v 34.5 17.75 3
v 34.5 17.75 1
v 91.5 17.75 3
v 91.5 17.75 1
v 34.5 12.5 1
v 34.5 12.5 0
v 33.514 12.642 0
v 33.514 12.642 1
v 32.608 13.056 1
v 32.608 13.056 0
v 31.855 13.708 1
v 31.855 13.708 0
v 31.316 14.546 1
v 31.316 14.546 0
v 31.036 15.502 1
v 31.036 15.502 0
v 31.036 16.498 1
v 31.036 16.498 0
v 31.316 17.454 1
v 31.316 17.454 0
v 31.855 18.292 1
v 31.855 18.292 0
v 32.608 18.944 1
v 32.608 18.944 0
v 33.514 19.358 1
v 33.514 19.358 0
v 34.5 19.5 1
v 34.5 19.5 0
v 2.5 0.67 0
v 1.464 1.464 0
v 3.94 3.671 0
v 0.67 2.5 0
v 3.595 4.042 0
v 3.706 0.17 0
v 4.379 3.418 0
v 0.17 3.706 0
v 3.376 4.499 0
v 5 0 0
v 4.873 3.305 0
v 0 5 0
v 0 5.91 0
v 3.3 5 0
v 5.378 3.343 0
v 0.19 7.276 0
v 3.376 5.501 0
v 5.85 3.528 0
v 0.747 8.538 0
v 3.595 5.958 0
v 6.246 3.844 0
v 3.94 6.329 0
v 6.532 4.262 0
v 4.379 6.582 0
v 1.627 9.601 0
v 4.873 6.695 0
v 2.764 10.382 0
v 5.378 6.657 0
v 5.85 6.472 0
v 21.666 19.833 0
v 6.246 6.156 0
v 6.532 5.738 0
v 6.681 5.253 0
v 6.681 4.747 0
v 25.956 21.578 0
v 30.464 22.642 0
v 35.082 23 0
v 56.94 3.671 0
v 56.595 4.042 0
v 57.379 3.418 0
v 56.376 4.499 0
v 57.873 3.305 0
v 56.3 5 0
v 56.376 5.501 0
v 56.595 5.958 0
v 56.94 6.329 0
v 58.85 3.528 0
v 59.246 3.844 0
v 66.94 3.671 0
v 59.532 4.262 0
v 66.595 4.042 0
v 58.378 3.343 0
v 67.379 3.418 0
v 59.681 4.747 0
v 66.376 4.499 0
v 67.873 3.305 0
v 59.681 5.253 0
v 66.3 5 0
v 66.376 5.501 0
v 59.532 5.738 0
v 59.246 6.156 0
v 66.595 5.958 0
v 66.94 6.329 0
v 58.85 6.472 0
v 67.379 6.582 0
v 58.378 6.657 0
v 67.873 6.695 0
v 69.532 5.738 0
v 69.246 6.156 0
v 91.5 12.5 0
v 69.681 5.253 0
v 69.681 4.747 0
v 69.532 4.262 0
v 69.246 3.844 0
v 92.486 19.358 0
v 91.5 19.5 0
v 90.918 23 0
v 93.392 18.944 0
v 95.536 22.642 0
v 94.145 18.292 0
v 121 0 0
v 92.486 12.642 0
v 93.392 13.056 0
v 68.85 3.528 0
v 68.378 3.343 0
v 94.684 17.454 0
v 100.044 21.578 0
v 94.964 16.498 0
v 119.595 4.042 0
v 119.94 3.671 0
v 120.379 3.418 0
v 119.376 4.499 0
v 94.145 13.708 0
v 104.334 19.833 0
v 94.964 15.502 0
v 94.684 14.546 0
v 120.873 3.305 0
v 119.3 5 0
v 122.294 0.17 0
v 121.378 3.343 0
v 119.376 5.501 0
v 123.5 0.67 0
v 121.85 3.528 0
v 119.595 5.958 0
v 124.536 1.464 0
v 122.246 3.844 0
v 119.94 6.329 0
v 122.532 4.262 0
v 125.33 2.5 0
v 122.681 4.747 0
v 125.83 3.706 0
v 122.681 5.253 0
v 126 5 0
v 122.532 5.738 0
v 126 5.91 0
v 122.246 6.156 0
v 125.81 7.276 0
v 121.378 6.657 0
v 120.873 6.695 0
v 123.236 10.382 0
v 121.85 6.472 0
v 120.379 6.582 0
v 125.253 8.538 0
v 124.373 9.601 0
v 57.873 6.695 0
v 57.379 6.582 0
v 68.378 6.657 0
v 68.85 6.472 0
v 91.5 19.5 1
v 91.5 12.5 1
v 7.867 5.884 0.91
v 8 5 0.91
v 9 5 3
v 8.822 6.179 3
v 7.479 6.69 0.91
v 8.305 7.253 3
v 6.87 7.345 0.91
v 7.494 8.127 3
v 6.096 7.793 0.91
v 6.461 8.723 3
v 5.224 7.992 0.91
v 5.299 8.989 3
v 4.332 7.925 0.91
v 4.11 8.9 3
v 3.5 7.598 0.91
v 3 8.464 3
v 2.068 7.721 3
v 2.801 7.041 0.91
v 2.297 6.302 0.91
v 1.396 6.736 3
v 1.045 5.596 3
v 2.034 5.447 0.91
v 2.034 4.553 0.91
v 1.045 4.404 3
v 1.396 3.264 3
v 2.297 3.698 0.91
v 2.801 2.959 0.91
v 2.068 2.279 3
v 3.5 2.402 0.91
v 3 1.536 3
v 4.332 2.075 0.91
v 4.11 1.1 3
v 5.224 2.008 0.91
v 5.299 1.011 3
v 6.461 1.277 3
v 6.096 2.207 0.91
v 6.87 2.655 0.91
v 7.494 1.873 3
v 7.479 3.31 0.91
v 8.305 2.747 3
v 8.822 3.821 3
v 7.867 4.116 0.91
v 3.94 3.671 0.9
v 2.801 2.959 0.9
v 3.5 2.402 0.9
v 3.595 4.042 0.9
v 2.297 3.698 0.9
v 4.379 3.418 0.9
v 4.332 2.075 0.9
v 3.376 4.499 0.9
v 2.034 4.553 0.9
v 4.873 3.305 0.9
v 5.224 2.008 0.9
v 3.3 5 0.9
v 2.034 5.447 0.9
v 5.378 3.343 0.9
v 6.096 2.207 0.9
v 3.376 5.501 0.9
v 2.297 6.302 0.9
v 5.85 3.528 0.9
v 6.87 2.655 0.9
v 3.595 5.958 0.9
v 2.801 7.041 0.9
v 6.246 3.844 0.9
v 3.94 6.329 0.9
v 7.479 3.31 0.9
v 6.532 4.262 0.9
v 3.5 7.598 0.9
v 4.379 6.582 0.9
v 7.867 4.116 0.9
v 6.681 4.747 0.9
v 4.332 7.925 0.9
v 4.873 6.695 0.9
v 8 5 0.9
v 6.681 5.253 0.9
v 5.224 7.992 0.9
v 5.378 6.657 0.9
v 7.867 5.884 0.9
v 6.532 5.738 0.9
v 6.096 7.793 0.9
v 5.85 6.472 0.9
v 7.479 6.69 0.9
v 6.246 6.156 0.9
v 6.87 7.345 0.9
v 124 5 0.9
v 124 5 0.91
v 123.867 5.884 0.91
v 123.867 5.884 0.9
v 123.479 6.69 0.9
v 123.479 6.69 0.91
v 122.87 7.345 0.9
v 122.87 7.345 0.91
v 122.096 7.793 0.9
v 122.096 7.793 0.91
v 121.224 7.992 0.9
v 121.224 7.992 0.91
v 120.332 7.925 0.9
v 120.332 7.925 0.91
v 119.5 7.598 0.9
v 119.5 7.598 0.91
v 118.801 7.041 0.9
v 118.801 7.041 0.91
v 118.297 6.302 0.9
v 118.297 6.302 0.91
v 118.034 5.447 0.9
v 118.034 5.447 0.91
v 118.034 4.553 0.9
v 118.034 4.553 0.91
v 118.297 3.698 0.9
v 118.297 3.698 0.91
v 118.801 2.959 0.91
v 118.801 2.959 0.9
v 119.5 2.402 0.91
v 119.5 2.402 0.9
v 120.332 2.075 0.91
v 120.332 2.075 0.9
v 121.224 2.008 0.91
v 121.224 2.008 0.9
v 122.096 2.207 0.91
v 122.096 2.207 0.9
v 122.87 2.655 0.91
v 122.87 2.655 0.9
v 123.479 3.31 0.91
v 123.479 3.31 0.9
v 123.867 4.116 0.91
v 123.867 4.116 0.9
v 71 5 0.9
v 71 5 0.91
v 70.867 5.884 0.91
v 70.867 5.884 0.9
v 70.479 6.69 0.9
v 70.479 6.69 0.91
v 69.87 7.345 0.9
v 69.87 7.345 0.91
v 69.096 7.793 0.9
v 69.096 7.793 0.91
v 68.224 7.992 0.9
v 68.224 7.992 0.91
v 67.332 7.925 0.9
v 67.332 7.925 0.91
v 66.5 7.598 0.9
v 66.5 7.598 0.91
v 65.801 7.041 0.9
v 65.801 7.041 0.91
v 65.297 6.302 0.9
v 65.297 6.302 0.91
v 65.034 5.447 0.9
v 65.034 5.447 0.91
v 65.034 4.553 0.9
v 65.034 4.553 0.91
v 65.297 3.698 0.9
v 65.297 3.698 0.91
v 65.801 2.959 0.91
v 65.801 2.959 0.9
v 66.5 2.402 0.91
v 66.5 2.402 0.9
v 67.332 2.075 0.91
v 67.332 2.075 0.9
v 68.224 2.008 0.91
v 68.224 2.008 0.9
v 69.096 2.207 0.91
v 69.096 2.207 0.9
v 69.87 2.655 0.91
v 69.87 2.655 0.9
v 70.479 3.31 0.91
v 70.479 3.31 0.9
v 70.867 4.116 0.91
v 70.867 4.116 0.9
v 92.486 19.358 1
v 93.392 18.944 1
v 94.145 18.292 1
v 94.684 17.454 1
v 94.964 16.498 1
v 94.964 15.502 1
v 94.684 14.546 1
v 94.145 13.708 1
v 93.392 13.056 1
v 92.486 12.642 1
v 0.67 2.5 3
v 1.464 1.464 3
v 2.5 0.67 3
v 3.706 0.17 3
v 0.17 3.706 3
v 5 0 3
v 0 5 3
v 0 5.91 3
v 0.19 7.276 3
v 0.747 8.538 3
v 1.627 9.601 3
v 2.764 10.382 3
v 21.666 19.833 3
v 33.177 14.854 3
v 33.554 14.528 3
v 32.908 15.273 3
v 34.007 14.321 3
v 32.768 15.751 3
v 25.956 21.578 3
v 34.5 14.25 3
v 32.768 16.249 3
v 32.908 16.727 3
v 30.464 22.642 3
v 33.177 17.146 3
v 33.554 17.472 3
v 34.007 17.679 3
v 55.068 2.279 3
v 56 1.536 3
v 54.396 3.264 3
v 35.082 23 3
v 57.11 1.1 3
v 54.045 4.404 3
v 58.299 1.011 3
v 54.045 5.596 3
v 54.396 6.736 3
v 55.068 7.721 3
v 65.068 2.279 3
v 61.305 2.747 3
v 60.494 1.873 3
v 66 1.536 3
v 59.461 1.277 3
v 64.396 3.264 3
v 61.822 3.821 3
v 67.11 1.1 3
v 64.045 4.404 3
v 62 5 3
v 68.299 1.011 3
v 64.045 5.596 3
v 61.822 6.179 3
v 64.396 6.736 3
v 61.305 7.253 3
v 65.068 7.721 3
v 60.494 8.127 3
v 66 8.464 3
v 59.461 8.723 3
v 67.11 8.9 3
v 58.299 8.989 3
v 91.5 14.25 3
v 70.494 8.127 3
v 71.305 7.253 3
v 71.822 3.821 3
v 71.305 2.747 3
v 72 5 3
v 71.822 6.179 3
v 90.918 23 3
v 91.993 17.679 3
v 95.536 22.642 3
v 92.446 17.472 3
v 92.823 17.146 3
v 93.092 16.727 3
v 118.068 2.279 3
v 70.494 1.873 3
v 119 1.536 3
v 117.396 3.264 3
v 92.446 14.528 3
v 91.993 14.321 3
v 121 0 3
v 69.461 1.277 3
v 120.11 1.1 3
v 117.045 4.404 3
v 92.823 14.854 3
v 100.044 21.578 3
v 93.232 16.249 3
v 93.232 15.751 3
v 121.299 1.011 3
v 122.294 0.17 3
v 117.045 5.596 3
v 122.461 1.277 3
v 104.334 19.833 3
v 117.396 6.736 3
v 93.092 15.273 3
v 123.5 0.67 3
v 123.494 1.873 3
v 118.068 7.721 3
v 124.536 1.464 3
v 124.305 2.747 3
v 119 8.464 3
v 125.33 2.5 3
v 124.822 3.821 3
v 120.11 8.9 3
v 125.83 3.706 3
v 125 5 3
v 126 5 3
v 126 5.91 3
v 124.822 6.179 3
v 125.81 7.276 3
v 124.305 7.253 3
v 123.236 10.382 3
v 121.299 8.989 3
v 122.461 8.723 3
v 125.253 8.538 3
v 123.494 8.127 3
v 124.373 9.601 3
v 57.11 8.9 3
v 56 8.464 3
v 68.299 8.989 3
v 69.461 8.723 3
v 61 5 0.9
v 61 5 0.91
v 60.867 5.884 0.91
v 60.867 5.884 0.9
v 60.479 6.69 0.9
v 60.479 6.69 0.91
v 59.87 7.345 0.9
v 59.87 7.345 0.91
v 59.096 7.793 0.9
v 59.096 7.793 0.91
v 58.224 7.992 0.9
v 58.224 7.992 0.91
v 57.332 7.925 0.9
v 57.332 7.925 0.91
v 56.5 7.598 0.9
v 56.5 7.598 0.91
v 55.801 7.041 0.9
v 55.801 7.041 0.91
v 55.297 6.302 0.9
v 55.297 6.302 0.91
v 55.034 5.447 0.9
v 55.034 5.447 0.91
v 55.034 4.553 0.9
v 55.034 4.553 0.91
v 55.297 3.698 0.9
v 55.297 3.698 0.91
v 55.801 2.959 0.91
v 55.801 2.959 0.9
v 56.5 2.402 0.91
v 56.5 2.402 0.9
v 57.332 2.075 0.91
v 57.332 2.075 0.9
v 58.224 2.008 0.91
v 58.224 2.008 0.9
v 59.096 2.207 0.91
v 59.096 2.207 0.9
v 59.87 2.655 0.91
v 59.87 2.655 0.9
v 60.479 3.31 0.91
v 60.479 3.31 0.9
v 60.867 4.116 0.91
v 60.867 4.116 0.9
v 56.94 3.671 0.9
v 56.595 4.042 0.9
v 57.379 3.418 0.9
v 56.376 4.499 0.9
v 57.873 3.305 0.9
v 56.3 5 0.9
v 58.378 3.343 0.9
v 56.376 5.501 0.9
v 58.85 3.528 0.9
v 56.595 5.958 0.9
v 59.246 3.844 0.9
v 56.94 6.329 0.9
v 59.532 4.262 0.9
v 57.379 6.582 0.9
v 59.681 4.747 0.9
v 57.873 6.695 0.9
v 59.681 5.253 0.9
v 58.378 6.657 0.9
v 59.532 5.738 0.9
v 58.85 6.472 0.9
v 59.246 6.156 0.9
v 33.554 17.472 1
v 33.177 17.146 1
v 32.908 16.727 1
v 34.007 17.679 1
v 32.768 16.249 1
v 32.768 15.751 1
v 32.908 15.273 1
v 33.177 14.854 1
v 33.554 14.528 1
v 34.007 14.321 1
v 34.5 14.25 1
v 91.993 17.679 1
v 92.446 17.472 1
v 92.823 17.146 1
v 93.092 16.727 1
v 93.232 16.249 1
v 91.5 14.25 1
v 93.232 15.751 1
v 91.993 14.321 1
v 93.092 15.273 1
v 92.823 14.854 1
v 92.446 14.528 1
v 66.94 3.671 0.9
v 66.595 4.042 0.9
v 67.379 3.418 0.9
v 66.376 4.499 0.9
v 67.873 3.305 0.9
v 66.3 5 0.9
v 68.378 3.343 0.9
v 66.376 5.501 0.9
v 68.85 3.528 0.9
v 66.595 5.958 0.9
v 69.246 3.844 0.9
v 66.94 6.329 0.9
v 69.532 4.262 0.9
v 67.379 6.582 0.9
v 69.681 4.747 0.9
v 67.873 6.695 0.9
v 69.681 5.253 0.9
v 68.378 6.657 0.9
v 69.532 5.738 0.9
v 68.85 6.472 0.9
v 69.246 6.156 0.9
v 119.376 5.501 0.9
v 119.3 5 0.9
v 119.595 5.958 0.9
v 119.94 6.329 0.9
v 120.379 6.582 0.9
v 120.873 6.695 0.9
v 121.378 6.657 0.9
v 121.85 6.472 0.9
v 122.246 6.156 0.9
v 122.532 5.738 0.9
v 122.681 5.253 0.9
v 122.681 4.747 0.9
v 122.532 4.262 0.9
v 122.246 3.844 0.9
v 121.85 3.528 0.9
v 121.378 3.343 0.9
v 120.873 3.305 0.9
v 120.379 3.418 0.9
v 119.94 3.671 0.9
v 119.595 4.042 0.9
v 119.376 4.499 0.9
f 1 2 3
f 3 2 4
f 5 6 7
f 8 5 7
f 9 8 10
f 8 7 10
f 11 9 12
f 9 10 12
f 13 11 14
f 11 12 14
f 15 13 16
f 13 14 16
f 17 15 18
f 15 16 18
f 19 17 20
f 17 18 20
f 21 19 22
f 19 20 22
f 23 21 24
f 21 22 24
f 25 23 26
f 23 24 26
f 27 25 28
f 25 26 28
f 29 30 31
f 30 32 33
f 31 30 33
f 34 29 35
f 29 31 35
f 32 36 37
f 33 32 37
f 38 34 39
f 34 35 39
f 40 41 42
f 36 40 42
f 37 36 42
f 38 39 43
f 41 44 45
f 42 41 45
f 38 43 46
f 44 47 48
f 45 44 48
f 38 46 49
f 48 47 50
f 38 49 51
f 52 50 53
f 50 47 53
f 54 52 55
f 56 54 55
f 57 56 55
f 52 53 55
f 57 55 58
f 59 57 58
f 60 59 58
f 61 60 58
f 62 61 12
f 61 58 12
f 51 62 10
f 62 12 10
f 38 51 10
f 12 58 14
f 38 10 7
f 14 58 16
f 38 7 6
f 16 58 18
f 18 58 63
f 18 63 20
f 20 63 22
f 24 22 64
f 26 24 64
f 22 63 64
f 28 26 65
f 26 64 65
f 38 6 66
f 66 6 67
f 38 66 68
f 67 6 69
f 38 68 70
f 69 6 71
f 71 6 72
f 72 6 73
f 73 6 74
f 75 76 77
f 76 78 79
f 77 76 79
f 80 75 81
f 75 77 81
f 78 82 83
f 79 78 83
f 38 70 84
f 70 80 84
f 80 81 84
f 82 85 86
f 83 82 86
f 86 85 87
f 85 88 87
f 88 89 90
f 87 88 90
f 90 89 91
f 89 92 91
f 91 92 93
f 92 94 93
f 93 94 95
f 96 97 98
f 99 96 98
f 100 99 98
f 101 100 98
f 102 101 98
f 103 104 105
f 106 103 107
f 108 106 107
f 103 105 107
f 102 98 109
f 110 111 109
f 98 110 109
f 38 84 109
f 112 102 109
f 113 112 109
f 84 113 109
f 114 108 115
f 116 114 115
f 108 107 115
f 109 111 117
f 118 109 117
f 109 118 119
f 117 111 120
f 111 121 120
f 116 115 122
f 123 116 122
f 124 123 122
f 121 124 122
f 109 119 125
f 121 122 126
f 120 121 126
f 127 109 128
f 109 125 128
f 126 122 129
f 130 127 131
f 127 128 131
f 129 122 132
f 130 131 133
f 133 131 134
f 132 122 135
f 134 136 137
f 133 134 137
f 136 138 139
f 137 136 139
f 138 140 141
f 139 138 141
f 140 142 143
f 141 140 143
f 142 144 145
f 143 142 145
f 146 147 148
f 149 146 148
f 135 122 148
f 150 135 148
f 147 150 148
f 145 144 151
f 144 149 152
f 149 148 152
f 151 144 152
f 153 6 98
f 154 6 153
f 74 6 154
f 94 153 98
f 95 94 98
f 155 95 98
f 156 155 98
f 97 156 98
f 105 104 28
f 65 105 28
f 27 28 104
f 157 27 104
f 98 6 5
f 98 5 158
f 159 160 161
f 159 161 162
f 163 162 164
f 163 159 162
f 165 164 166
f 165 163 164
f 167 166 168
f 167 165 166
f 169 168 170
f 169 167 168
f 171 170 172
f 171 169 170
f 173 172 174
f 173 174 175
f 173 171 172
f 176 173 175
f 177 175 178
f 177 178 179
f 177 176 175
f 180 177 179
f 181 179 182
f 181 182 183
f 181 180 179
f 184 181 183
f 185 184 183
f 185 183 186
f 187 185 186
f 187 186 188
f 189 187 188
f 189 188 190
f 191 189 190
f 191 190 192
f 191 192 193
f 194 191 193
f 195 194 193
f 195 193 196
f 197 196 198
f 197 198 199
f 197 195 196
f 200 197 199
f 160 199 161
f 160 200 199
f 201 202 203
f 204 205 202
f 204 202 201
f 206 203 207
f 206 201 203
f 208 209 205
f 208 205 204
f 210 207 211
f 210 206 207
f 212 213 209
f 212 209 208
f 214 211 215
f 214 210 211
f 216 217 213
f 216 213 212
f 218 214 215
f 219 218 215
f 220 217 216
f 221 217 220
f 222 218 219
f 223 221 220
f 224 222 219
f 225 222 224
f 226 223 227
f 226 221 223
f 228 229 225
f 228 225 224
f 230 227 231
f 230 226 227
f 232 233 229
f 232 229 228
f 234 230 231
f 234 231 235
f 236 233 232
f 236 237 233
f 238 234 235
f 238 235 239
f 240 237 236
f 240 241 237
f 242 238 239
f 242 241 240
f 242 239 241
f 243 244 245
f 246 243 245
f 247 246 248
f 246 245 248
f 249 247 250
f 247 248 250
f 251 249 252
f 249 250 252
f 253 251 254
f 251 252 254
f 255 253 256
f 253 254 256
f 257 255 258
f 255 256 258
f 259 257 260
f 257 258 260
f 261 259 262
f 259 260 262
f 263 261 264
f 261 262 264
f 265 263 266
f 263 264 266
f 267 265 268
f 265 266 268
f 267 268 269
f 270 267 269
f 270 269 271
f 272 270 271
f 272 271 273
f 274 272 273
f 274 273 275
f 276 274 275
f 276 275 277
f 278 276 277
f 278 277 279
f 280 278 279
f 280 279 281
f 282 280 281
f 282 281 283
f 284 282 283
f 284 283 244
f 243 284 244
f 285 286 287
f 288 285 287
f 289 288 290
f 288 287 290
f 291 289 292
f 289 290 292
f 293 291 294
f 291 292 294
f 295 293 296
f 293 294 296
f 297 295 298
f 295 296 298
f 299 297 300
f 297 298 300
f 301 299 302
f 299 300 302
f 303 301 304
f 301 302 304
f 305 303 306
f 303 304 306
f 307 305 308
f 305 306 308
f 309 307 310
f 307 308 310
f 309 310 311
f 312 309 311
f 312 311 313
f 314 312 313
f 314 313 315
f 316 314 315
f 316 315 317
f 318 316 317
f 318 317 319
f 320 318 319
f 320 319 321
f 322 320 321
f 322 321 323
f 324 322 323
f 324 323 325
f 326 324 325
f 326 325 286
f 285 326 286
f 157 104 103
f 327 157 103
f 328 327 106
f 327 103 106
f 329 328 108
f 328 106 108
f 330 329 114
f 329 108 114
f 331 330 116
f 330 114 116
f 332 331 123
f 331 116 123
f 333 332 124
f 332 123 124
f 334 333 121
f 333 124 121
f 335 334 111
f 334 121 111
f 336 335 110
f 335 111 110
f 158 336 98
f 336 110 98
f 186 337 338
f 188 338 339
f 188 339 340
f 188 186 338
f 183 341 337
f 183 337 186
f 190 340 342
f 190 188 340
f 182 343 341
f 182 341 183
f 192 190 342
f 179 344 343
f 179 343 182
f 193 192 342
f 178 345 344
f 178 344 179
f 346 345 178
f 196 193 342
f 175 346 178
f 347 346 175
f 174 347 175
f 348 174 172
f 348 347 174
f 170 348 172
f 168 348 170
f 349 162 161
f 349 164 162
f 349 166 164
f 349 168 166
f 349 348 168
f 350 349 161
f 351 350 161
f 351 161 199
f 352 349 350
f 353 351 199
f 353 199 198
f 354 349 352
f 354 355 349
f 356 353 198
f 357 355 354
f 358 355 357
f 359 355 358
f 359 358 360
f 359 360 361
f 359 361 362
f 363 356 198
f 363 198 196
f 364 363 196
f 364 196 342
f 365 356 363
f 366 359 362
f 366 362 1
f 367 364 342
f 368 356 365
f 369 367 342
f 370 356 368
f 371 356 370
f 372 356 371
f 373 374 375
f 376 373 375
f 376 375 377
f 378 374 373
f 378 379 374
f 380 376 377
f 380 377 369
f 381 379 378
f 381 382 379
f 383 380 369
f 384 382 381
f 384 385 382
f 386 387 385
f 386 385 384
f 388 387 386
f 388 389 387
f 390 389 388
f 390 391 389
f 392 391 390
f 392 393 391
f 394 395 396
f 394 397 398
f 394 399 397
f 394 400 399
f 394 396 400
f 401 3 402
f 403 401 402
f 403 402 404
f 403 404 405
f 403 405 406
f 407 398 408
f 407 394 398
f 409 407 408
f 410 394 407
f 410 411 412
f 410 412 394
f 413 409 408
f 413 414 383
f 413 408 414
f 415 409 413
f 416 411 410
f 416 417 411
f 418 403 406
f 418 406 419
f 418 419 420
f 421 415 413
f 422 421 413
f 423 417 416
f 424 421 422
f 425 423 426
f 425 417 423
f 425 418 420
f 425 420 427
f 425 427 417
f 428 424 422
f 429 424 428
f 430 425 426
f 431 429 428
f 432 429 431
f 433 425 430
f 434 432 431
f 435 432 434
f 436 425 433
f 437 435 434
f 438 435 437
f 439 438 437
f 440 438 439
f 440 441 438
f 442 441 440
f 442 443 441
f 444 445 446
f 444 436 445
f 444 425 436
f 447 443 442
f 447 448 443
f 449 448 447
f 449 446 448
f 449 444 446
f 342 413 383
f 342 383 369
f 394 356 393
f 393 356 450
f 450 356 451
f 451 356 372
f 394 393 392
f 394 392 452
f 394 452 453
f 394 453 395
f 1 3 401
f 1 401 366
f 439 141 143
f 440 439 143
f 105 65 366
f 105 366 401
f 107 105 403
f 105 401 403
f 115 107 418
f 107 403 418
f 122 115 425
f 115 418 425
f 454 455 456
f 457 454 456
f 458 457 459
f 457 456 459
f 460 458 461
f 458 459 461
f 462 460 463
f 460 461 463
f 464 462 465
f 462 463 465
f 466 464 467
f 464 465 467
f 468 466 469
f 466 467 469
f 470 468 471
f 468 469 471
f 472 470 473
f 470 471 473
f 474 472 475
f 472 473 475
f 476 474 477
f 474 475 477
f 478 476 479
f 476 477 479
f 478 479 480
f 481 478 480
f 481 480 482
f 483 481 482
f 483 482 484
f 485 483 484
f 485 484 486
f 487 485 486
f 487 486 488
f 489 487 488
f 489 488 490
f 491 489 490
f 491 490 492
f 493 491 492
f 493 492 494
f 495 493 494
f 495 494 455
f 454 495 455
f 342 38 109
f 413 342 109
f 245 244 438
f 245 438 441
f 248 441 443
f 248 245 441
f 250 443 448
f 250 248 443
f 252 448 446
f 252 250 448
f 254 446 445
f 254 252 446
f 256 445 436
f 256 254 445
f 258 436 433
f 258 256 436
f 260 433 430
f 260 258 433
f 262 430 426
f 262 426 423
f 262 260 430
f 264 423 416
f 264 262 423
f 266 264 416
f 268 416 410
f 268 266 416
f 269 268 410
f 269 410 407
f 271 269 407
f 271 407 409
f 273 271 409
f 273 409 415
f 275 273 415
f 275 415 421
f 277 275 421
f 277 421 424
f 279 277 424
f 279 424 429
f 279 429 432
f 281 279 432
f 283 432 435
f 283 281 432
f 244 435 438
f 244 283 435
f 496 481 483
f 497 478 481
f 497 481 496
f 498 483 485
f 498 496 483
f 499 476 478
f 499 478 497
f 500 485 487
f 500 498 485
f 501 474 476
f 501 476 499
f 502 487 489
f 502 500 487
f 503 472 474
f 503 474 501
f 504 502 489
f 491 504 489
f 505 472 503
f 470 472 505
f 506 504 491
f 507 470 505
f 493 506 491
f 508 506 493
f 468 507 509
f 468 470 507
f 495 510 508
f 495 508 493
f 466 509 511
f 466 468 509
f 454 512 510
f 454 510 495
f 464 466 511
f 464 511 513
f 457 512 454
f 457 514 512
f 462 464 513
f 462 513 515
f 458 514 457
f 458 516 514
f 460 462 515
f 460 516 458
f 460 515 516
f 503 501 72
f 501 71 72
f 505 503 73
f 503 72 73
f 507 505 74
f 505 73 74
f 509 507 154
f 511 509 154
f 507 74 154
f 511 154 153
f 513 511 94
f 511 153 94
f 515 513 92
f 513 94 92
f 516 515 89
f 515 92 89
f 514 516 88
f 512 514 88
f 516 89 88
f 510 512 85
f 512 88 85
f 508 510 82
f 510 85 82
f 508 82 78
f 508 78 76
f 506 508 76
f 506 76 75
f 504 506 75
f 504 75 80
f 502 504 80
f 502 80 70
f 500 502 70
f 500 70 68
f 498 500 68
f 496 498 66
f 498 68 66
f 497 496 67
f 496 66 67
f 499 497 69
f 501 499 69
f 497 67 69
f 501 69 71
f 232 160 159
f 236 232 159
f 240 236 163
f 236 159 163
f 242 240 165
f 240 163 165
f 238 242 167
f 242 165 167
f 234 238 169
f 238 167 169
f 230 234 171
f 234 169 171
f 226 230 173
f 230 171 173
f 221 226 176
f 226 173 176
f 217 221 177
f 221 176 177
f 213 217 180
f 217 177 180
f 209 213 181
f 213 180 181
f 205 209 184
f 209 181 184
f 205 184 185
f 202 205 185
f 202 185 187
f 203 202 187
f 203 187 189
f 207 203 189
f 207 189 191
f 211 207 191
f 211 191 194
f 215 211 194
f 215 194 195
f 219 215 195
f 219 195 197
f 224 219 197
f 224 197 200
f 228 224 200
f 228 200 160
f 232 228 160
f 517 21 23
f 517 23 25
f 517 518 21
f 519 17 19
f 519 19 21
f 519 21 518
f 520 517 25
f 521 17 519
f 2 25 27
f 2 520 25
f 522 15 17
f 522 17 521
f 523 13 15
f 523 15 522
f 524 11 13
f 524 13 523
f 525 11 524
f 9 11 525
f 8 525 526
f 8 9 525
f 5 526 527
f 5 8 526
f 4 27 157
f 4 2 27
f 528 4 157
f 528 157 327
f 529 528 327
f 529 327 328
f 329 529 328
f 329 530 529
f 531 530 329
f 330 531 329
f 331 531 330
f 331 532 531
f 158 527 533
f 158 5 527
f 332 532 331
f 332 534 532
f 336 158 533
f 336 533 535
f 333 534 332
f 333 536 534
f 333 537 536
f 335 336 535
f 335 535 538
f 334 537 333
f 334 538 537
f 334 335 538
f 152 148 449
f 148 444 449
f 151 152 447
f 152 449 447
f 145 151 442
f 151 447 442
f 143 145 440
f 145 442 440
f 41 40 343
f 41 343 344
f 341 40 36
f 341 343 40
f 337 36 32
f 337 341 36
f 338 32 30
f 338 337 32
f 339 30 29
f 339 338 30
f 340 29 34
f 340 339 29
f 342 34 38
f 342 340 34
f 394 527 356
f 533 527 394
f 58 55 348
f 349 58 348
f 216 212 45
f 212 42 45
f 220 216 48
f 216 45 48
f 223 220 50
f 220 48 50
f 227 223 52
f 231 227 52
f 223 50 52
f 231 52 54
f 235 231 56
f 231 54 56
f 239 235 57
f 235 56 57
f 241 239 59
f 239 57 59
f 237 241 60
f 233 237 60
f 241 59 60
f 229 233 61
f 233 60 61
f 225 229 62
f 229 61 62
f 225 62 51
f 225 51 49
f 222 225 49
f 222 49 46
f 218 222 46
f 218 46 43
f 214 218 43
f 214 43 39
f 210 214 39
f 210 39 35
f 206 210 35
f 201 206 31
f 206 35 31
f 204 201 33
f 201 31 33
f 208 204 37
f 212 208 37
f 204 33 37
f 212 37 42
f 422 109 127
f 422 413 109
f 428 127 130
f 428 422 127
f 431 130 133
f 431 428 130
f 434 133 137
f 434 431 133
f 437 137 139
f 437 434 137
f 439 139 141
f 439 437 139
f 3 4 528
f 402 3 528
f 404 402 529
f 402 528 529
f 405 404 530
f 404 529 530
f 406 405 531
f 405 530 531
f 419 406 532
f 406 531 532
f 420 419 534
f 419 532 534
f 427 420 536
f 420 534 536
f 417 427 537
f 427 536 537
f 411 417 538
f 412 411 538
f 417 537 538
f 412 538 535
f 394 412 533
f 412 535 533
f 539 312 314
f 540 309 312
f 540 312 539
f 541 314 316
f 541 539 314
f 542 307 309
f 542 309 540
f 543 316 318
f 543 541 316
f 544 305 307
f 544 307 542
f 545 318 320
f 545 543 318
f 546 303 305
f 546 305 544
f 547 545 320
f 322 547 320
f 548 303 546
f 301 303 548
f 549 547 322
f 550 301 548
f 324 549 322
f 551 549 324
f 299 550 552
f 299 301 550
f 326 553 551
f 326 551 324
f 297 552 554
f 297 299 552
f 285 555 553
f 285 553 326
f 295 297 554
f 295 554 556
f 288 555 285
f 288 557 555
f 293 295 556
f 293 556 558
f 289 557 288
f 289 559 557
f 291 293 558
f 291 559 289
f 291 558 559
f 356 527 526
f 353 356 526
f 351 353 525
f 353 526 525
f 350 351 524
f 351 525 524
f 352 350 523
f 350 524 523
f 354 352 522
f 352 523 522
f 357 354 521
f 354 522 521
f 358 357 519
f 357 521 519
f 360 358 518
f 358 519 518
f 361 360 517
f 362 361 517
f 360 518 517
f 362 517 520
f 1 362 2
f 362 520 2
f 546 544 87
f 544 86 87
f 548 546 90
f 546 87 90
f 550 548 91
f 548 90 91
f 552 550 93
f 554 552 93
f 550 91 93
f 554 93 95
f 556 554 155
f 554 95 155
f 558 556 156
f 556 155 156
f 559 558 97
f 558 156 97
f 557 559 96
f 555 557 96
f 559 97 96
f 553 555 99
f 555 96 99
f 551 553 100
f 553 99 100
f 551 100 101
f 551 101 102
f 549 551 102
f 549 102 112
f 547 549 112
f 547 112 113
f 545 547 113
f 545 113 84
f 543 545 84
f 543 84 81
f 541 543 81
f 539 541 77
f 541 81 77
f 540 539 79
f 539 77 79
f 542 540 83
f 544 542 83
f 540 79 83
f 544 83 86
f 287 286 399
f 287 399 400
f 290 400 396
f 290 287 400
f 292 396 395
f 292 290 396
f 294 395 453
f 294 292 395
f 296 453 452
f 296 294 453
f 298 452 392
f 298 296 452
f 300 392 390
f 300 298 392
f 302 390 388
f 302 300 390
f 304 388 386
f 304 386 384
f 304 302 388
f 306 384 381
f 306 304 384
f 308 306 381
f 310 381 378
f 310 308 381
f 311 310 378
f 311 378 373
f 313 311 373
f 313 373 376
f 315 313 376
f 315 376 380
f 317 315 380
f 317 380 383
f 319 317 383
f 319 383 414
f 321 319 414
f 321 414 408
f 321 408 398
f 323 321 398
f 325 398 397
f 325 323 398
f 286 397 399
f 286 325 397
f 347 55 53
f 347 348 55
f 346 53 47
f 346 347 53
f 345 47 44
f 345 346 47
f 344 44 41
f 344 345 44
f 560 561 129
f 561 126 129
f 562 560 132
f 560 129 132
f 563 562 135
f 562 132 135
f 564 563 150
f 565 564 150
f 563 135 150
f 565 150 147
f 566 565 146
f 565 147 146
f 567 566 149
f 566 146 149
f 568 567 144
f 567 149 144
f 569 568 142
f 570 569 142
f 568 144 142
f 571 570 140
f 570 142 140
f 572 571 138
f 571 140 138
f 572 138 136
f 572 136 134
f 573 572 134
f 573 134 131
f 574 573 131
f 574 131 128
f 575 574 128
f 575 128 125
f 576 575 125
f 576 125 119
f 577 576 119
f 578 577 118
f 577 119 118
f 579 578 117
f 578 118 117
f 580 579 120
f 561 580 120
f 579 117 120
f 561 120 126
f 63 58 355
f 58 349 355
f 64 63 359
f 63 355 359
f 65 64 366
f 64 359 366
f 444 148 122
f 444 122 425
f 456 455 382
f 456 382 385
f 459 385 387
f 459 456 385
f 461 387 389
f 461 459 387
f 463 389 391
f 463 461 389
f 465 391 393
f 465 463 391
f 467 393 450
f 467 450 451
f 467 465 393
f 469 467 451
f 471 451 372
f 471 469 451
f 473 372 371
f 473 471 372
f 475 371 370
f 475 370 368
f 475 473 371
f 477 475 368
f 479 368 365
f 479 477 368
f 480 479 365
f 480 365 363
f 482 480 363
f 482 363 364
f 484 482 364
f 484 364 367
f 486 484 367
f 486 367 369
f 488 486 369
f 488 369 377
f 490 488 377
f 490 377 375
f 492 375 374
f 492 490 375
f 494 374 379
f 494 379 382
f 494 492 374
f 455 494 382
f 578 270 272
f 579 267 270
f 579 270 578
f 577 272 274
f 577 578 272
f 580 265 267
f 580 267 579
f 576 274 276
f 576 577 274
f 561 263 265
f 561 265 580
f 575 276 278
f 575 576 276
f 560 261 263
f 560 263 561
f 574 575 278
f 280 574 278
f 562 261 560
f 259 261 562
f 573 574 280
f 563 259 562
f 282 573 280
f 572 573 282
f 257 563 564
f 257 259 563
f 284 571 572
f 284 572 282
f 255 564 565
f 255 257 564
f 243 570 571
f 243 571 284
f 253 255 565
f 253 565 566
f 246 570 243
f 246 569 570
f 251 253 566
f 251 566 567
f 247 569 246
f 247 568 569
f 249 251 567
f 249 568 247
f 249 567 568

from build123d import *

# Parameters (mm, degrees)
BOX001_W            = 126
BOX001_H            = 23
BOX001_DEPTH        = 3
HOLE003_D           = 3.4
HOLE003_DEPTH       = 24
HOLE003_CBORE_D     = 6
HOLE003_CBORE_DEPTH = 2.1
POCKET_DEPTH        = 1
POCKET001_DEPTH     = 5
CHAMFER_SIZE2       = 2.09
CHAMFER_SIZE        = 1
FILLET001_R         = 5
CHAMFER001_SIZE2    = 14
CHAMFER001_SIZE     = 28
CHAMFER002_SIZE2    = 14
CHAMFER002_SIZE     = 28
FILLET002_R         = 5
FILLET003_R         = 30


with BuildPart() as part:
    # Box001 → Box001 (join)
    with BuildSketch(Plane.XY):
        with Locations((63, 11.5)):
            Rectangle(BOX001_W, BOX001_H)
    extrude(amount=BOX001_DEPTH)

    # Hole003
    with Locations(Plane.XY.offset(3)):
        with Locations((5, 5), (58, 5), (68, 5), (121, 5)):
            CounterBoreHole(HOLE003_D / 2, HOLE003_CBORE_D / 2, HOLE003_CBORE_DEPTH, depth=HOLE003_DEPTH)

    # Sketch006 (on Face5 of Hole003) → Pocket (cut)
    with BuildSketch(Plane(origin=(0, 0, 0), x_dir=(1, 0, 0), z_dir=(0, 0, -1))):
        with BuildLine():
            ThreePointArc((34.5, -12.5), (31, -16), (34.5, -19.5))
            Line((34.5, -19.5), (91.5, -19.5))
            ThreePointArc((91.5, -19.5), (95, -16), (91.5, -12.5))
            Line((34.5, -12.5), (91.5, -12.5))
        make_face()
    extrude(amount=-POCKET_DEPTH, mode=Mode.SUBTRACT)

    # Sketch007 (on Face23 of Pocket) → Pocket001 (cut)
    with BuildSketch(Plane(origin=(0, 0, 1), x_dir=(1, 0, 0), z_dir=(0, 0, -1))):
        with BuildLine():
            ThreePointArc((34.5, -14.25), (32.75, -16), (34.5, -17.75))
            Line((34.5, -17.75), (91.5, -17.75))
            ThreePointArc((91.5, -17.75), (93.25, -16), (91.5, -14.25))
            Line((34.5, -14.25), (91.5, -14.25))
        make_face()
    extrude(amount=-POCKET001_DEPTH, mode=Mode.SUBTRACT)

    # Chamfer
    chamfer_edges = [part.edges().sort_by_distance(p)[0] for p in [
        (2, 5, 3),
        (55, 5, 3),
        (65, 5, 3),
        (118, 5, 3),
    ]]
    chamfer_side = part.faces().sort_by_distance((63, 11.420058, 3))[0]
    chamfer(chamfer_edges, length=CHAMFER_SIZE, length2=CHAMFER_SIZE2, reference=chamfer_side)

    # Fillet001
    fillet001_edges = [part.edges().sort_by_distance(p)[0] for p in [
        (0, 0, 1.5),
        (126, 0, 1.5),
    ]]
    fillet(fillet001_edges, radius=FILLET001_R)

    # Chamfer001
    chamfer001_edges = [part.edges().sort_by_distance(p)[0] for p in [
        (126, 23, 1.5),
    ]]
    chamfer001_side = part.faces().sort_by_distance((63, 23, 1.5))[0]
    chamfer(chamfer001_edges, length=CHAMFER001_SIZE, length2=CHAMFER001_SIZE2, reference=chamfer001_side)

    # Chamfer002
    chamfer002_edges = [part.edges().sort_by_distance(p)[0] for p in [
        (0, 23, 1.5),
    ]]
    chamfer002_side = part.faces().sort_by_distance((49, 23, 1.5))[0]
    chamfer(chamfer002_edges, length=CHAMFER002_SIZE, length2=CHAMFER002_SIZE2, reference=chamfer002_side)

    # Fillet002
    fillet002_edges = [part.edges().sort_by_distance(p)[0] for p in [
        (0, 9, 1.5),
        (126, 9, 1.5),
    ]]
    fillet(fillet002_edges, radius=FILLET002_R)

    # Fillet003
    fillet003_edges = [part.edges().sort_by_distance(p)[0] for p in [
        (28, 23, 1.5),
        (98, 23, 1.5),
    ]]
    fillet(fillet003_edges, radius=FILLET003_R)


solid = part.part
